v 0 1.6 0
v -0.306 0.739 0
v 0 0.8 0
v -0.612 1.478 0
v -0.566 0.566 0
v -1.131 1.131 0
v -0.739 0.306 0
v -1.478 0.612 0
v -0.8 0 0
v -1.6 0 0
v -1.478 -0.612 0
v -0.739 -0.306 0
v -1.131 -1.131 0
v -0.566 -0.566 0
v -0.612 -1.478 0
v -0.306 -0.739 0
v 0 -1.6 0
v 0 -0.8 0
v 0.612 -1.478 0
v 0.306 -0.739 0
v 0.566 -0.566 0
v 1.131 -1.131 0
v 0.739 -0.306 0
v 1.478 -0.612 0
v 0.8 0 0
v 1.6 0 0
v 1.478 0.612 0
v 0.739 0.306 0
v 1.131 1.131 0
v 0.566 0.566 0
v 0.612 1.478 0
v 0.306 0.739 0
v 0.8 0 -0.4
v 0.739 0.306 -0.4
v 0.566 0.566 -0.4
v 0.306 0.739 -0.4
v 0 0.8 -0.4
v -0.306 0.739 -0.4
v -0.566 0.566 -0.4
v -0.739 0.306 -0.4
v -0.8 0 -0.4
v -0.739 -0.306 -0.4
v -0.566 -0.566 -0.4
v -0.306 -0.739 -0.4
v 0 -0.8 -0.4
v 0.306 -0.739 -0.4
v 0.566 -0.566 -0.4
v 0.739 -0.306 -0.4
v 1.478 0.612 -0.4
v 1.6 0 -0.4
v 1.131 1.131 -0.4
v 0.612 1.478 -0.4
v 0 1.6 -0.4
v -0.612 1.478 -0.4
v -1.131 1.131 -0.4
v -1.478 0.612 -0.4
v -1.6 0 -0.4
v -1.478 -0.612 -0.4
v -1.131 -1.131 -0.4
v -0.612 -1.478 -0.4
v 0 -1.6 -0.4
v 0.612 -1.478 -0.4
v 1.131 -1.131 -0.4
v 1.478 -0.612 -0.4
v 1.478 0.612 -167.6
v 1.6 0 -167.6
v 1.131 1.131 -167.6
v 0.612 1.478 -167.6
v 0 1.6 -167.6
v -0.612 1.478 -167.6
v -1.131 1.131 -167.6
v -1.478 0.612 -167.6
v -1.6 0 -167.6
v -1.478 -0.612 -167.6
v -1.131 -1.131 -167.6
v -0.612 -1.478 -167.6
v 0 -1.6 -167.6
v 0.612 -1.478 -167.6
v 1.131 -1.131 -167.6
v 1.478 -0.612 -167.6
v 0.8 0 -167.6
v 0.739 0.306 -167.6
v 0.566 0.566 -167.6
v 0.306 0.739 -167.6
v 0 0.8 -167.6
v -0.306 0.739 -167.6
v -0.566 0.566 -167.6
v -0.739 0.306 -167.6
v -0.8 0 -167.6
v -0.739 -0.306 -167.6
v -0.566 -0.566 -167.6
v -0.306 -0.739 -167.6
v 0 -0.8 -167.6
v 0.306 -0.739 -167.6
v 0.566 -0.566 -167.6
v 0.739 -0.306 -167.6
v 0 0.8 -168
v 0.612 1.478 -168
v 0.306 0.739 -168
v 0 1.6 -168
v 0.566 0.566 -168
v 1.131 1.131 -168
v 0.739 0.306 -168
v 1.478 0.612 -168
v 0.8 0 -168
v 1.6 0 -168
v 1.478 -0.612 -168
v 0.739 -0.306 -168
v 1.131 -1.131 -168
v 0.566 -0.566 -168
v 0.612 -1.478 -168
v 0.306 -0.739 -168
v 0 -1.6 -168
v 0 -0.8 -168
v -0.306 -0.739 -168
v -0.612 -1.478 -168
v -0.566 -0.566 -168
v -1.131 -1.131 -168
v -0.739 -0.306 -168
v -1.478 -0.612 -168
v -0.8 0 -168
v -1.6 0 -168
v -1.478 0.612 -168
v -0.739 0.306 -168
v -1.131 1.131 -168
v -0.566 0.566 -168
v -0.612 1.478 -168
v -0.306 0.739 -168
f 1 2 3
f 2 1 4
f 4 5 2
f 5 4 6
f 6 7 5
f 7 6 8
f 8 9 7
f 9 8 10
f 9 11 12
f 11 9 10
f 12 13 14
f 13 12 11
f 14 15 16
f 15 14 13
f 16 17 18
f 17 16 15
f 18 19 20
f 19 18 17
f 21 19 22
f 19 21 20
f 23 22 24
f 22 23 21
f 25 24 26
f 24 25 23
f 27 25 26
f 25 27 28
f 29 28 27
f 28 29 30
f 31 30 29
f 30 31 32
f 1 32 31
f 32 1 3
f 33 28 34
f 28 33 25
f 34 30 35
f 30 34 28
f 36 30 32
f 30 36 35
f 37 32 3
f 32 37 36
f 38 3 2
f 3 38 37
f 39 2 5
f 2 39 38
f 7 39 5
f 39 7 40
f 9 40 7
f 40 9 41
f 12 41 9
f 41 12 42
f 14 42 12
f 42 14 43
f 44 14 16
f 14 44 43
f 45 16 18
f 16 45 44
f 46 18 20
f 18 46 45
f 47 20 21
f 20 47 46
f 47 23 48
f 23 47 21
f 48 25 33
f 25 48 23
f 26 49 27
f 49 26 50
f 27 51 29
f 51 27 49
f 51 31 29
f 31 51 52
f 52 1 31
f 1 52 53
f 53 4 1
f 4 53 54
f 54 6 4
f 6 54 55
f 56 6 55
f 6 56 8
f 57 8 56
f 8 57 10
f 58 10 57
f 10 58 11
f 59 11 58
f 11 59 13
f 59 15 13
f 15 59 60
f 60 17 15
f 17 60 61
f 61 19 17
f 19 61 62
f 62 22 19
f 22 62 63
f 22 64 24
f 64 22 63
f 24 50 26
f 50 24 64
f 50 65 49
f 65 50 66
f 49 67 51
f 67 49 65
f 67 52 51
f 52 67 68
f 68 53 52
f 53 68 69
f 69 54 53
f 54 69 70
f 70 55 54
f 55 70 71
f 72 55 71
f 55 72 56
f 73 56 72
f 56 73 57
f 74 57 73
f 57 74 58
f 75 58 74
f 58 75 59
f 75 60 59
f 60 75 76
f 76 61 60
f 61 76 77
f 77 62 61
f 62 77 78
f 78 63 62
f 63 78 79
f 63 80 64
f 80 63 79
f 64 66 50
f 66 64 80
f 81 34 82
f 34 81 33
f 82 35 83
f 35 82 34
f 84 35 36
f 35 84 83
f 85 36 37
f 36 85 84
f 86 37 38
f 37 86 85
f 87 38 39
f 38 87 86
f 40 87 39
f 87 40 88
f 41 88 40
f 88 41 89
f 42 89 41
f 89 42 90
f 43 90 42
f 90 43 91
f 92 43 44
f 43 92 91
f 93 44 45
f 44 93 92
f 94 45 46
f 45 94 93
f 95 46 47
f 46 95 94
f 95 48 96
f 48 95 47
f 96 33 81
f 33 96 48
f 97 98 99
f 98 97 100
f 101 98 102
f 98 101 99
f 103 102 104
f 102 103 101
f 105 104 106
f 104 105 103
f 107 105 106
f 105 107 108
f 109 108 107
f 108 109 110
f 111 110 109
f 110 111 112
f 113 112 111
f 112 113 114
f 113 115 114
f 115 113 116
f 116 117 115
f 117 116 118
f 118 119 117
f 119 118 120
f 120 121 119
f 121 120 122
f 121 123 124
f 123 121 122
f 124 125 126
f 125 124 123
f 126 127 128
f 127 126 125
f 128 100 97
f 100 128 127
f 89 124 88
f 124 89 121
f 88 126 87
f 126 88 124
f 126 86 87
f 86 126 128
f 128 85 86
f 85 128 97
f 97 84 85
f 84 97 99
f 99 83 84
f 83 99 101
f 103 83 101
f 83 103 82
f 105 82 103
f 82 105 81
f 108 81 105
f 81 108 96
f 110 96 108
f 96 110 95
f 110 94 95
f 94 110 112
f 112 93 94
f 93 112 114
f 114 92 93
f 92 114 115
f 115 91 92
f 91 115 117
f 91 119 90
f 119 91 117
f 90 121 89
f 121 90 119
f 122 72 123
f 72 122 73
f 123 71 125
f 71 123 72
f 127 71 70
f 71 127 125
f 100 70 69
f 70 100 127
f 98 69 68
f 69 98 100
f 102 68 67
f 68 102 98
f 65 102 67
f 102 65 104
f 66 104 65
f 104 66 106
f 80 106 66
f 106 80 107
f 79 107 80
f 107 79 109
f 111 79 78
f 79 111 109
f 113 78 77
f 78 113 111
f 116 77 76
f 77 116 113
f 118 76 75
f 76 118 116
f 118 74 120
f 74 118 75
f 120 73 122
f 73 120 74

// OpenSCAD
// file: ../p/4-4disc.scad
use <../lib.scad>
$fa=1; $fs=0.2;
function ldraw_lib__4_4disc(realsolid=false) = [
// 0 Disc 1.0
// 0 Name: 4-4disc.dat
// 0 Author: James Jessiman
// 0 !LDRAW_ORG Primitive UPDATE 2002-02
// 0 !LICENSE Licensed under CC BY 2.0 and CC BY 4.0 : see CAreadme.txt
// 
// 0 BFC CERTIFY CCW
  [0,"BFC","CERTIFY"],
  [0,"BFC","CCW"],
// 
// 0 !HISTORY 1998-12-15 [PTadmin] Official Update 1998-10
// 0 !HISTORY 2002-03-23 [sbliss] Added BFC statement
// 0 !HISTORY 2002-04-25 [PTadmin] Official Update 2002-02
// 0 !HISTORY 2007-06-24 [PTadmin] Header formatted for Contributor Agreement
// 0 !HISTORY 2008-07-01 [PTadmin] Official Update 2008-01
// 
// 
// 3 16 0 0 0 1 0 0 0.9239 0 0.3827
  [3,16,0,0,0,1,0,0,0.9239,0,0.3827],
// 3 16 0 0 0 0.9239 0 0.3827 0.7071 0 0.7071
  [3,16,0,0,0,0.9239,0,0.3827,0.7071,0,0.7071],
// 3 16 0 0 0 0.7071 0 0.7071 0.3827 0 0.9239
  [3,16,0,0,0,0.7071,0,0.7071,0.3827,0,0.9239],
// 3 16 0 0 0 0.3827 0 0.9239 0 0 1
  [3,16,0,0,0,0.3827,0,0.9239,0,0,1],
// 3 16 0 0 0 0 0 1 -0.3827 0 0.9239
  [3,16,0,0,0,0,0,1,-0.3827,0,0.9239],
// 3 16 0 0 0 -0.3827 0 0.9239 -0.7071 0 0.7071
  [3,16,0,0,0,-0.3827,0,0.9239,-0.7071,0,0.7071],
// 3 16 0 0 0 -0.7071 0 0.7071 -0.9239 0 0.3827
  [3,16,0,0,0,-0.7071,0,0.7071,-0.9239,0,0.3827],
// 3 16 0 0 0 -0.9239 0 0.3827 -1 0 -0
  [3,16,0,0,0,-0.9239,0,0.3827,-1,0,-0],
// 3 16 0 0 0 -1 0 -0 -0.9239 0 -0.3827
  [3,16,0,0,0,-1,0,-0,-0.9239,0,-0.3827],
// 3 16 0 0 0 -0.9239 0 -0.3827 -0.7071 0 -0.7071
  [3,16,0,0,0,-0.9239,0,-0.3827,-0.7071,0,-0.7071],
// 3 16 0 0 0 -0.7071 0 -0.7071 -0.3827 0 -0.9239
  [3,16,0,0,0,-0.7071,0,-0.7071,-0.3827,0,-0.9239],
// 3 16 0 0 0 -0.3827 0 -0.9239 0 0 -1
  [3,16,0,0,0,-0.3827,0,-0.9239,0,0,-1],
// 3 16 0 0 0 0 0 -1 0.3827 0 -0.9239
  [3,16,0,0,0,0,0,-1,0.3827,0,-0.9239],
// 3 16 0 0 0 0.3827 0 -0.9239 0.7071 0 -0.7071
  [3,16,0,0,0,0.3827,0,-0.9239,0.7071,0,-0.7071],
// 3 16 0 0 0 0.7071 0 -0.7071 0.9239 0 -0.3827
  [3,16,0,0,0,0.7071,0,-0.7071,0.9239,0,-0.3827],
// 3 16 0 0 0 0.9239 0 -0.3827 1 0 0
  [3,16,0,0,0,0.9239,0,-0.3827,1,0,0],
// 0
];
module ldraw_lib__4_4disc(step=0, col=false, unit=2/5, alt=false, line=0.2, solid=!$preview)
    makepoly(ldraw_lib__4_4disc(solid), step=step, col=col, unit=unit, alt=alt, line=line, solid=solid);
ldraw_lib__4_4disc(line=0.2);
// file: ../p/stud3.scad
use <../lib.scad>
use <4-4cyli.scad>
use <4-4disc.scad>
use <4-4edge.scad>
$fa=1; $fs=0.2;
function ldraw_lib__stud3(realsolid=false) = realsolid ? 
    [openscad(translate([0,0,-eps()], o=cylinder(4+eps(), r=4)),2)] : [
// 0 Stud Tube Solid
// 0 Name: stud3.dat
// 0 Author: James Jessiman
// 0 !LDRAW_ORG Primitive UPDATE 2012-01
// 0 !LICENSE Licensed under CC BY 2.0 and CC BY 4.0 : see CAreadme.txt
// 
// 0 BFC CERTIFY CCW
  [0,"BFC","CERTIFY"],
  [0,"BFC","CCW"],
// 
// 0 !HISTORY 2002-04-04 [sbliss] Modified for BFC compliance
// 0 !HISTORY 2002-04-25 [PTadmin] Official Update 2002-02
// 0 !HISTORY 2007-06-24 [PTadmin] Header formatted for Contributor Agreement
// 0 !HISTORY 2008-07-01 [PTadmin] Official Update 2008-01
// 0 !HISTORY 2012-02-16 [Philo] Changed to CCW
// 0 !HISTORY 2012-03-30 [PTadmin] Official Update 2012-01
// 
// 
// 1 16 0 -4 0 4 0 0 0 1 0 0 0 4 4-4edge.dat
  [1,16,0,-4,0,4,0,0,0,1,0,0,0,4, ldraw_lib__4_4edge(realsolid)],
// 1 16 0 0 0 4 0 0 0 1 0 0 0 4 4-4edge.dat
  [1,16,0,0,0,4,0,0,0,1,0,0,0,4, ldraw_lib__4_4edge(realsolid)],
// 1 16 0 -4 0 4 0 0 0 1 0 0 0 4 4-4disc.dat
  [1,16,0,-4,0,4,0,0,0,1,0,0,0,4, ldraw_lib__4_4disc(realsolid)],
// 1 16 0 -4 0 4 0 0 0 4 0 0 0 4 4-4cyli.dat
  [1,16,0,-4,0,4,0,0,0,4,0,0,0,4, ldraw_lib__4_4cyli(realsolid)],
];
module ldraw_lib__stud3(step=0, col=false, unit=2/5, alt=false, line=0.2, solid=!$preview)
    makepoly(ldraw_lib__stud3(solid), step=step, col=col, unit=unit, alt=alt, line=line, solid=solid);
ldraw_lib__stud3(line=0.2);
// file: ../p/stud.scad
use <../lib.scad>
use <4-4cyli.scad>
use <4-4disc.scad>
use <4-4edge.scad>
$fa=1; $fs=0.2;
function ldraw_lib__stud(realsolid=false) = realsolid ? 
    [openscad(translate([0,0,-eps()], o=cylinder(4+eps(), r=6)),2)] : [
// 0 Stud
// 0 Name: stud.dat
// 0 Author: James Jessiman
// 0 !LDRAW_ORG Primitive UPDATE 2012-01
// 0 !LICENSE Licensed under CC BY 2.0 and CC BY 4.0 : see CAreadme.txt
// 
// 0 BFC CERTIFY CCW
  [0,"BFC","CERTIFY"],
  [0,"BFC","CCW"],
// 
// 0 !HISTORY 2002-04-04 [sbliss] Modified for BFC compliance
// 0 !HISTORY 2002-04-25 [PTadmin] Official Update 2002-02
// 0 !HISTORY 2007-06-24 [PTadmin] Header formatted for Contributor Agreement
// 0 !HISTORY 2008-07-01 [PTadmin] Official Update 2008-01
// 0 !HISTORY 2012-02-16 [Philo] Changed to CCW
// 0 !HISTORY 2012-03-30 [PTadmin] Official Update 2012-01
// 
// 
// 1 16 0 0 0 6 0 0 0 1 0 0 0 6 4-4edge.dat
  [1,16,0,0,0,6,0,0,0,1,0,0,0,6, ldraw_lib__4_4edge(realsolid)],
// 1 16 0 -4 0 6 0 0 0 1 0 0 0 6 4-4edge.dat
  [1,16,0,-4,0,6,0,0,0,1,0,0,0,6, ldraw_lib__4_4edge(realsolid)],
// 1 16 0 0 0 6 0 0 0 -4 0 0 0 6 4-4cyli.dat
  [1,16,0,0,0,6,0,0,0,-4,0,0,0,6, ldraw_lib__4_4cyli(realsolid)],
// 1 16 0 -4 0 6 0 0 0 1 0 0 0 6 4-4disc.dat
  [1,16,0,-4,0,6,0,0,0,1,0,0,0,6, ldraw_lib__4_4disc(realsolid)],
];
module ldraw_lib__stud(step=0, col=false, unit=2/5, alt=false, line=0.2, solid=!$preview)
    makepoly(ldraw_lib__stud(solid), step=step, col=col, unit=unit, alt=alt, line=line, solid=solid);
ldraw_lib__stud(line=0.2);
// file: ../p/box5.scad
use <../lib.scad>
$fa=1; $fs=0.2;
function ldraw_lib__box5(realsolid=false) = [
// 0 Box with 5 Faces and All Edges
// 0 Name: box5.dat
// 0 Author: James Jessiman
// 0 !LDRAW_ORG Primitive UPDATE 2012-01
// 0 !LICENSE Licensed under CC BY 2.0 and CC BY 4.0 : see CAreadme.txt
// 
// 0 BFC CERTIFY CCW
  [0,"BFC","CERTIFY"],
  [0,"BFC","CCW"],
// 
// 0 !HISTORY 2002-04-03 [sbliss] Modified for BFC compliance
// 0 !HISTORY 2002-04-25 [PTadmin] Official Update 2002-02
// 0 !HISTORY 2007-06-24 [PTadmin] Header formatted for Contributor Agreement
// 0 !HISTORY 2008-07-01 [PTadmin] Official Update 2008-01
// 0 !HISTORY 2012-02-16 [Philo] Changed to CCW
// 0 !HISTORY 2012-03-30 [PTadmin] Official Update 2012-01
// 
// 
// 2 24 1 1 1 -1 1 1
  [2,24,1,1,1,-1,1,1],
// 2 24 -1 1 1 -1 1 -1
  [2,24,-1,1,1,-1,1,-1],
// 2 24 -1 1 -1 1 1 -1
  [2,24,-1,1,-1,1,1,-1],
// 2 24 1 1 -1 1 1 1
  [2,24,1,1,-1,1,1,1],
// 2 24 1 0 1 -1 0 1
  [2,24,1,0,1,-1,0,1],
// 2 24 -1 0 1 -1 0 -1
  [2,24,-1,0,1,-1,0,-1],
// 2 24 -1 0 -1 1 0 -1
  [2,24,-1,0,-1,1,0,-1],
// 2 24 1 0 -1 1 0 1
  [2,24,1,0,-1,1,0,1],
// 2 24 1 0 1 1 1 1
  [2,24,1,0,1,1,1,1],
// 2 24 -1 0 1 -1 1 1
  [2,24,-1,0,1,-1,1,1],
// 2 24 1 0 -1 1 1 -1
  [2,24,1,0,-1,1,1,-1],
// 2 24 -1 0 -1 -1 1 -1
  [2,24,-1,0,-1,-1,1,-1],
// 4 16 -1 1 1 1 1 1 1 1 -1 -1 1 -1
  [4,16,-1,1,1,1,1,1,1,1,-1,-1,1,-1],
// 4 16 -1 1 1 -1 0 1 1 0 1 1 1 1
  [4,16,-1,1,1,-1,0,1,1,0,1,1,1,1],
// 4 16 -1 1 -1 -1 0 -1 -1 0 1 -1 1 1
  [4,16,-1,1,-1,-1,0,-1,-1,0,1,-1,1,1],
// 4 16 1 1 -1 1 0 -1 -1 0 -1 -1 1 -1
  [4,16,1,1,-1,1,0,-1,-1,0,-1,-1,1,-1],
// 4 16 1 1 1 1 0 1 1 0 -1 1 1 -1
  [4,16,1,1,1,1,0,1,1,0,-1,1,1,-1],
];
module ldraw_lib__box5(step=0, col=false, unit=2/5, alt=false, line=0.2, solid=!$preview)
    makepoly(ldraw_lib__box5(solid), step=step, col=col, unit=unit, alt=alt, line=line, solid=solid);
ldraw_lib__box5(line=0.2);
// file: ../p/box4t.scad
use <../lib.scad>
$fa=1; $fs=0.2;
function ldraw_lib__box4t(realsolid=false) = [
// 0 Box with 4 Adjacent Faces and All Edges
// 0 Name: box4t.dat
// 0 Author: Tore Eriksson [Tore_Eriksson]
// 0 !LDRAW_ORG Primitive UPDATE 2003-02
// 0 !LICENSE Licensed under CC BY 2.0 and CC BY 4.0 : see CAreadme.txt
// 
// 0 BFC CERTIFY CCW
  [0,"BFC","CERTIFY"],
  [0,"BFC","CCW"],
// 
// 0 !HISTORY 1997-09-29 [PTadmin] Official Update 1997-15
// 0 !HISTORY 2002-08-31 [izanette] Modified with WINDZ for BFC compliance
// 0 !HISTORY 2003-08-01 [PTadmin] Official Update 2003-02
// 0 !HISTORY 2007-06-24 [PTadmin] Header formatted for Contributor Agreement
// 0 !HISTORY 2008-07-01 [PTadmin] Official Update 2008-01
// 
// 
// 2 24 1 1 1 -1 1 1
  [2,24,1,1,1,-1,1,1],
// 2 24 -1 1 1 -1 1 -1
  [2,24,-1,1,1,-1,1,-1],
// 2 24 -1 1 -1 1 1 -1
  [2,24,-1,1,-1,1,1,-1],
// 2 24 1 1 -1 1 1 1
  [2,24,1,1,-1,1,1,1],
// 2 24 1 0 1 -1 0 1
  [2,24,1,0,1,-1,0,1],
// 2 24 -1 0 1 -1 0 -1
  [2,24,-1,0,1,-1,0,-1],
// 2 24 -1 0 -1 1 0 -1
  [2,24,-1,0,-1,1,0,-1],
// 2 24 1 0 -1 1 0 1
  [2,24,1,0,-1,1,0,1],
// 2 24 1 0 1 1 1 1
  [2,24,1,0,1,1,1,1],
// 2 24 -1 0 1 -1 1 1
  [2,24,-1,0,1,-1,1,1],
// 2 24 1 0 -1 1 1 -1
  [2,24,1,0,-1,1,1,-1],
// 2 24 -1 0 -1 -1 1 -1
  [2,24,-1,0,-1,-1,1,-1],
// 4 16 1 1 1 1 1 -1 -1 1 -1 -1 1 1
  [4,16,1,1,1,1,1,-1,-1,1,-1,-1,1,1],
// 4 16 1 1 1 -1 1 1 -1 0 1 1 0 1
  [4,16,1,1,1,-1,1,1,-1,0,1,1,0,1],
// 4 16 -1 1 1 -1 1 -1 -1 0 -1 -1 0 1
  [4,16,-1,1,1,-1,1,-1,-1,0,-1,-1,0,1],
// 0 4 16 -1 1 -1 -1 0 -1 1 0 -1 1 1 -1
// 4 16 1 1 -1 1 1 1 1 0 1 1 0 -1
  [4,16,1,1,-1,1,1,1,1,0,1,1,0,-1],
// 0
];
module ldraw_lib__box4t(step=0, col=false, unit=2/5, alt=false, line=0.2, solid=!$preview)
    makepoly(ldraw_lib__box4t(solid), step=step, col=col, unit=unit, alt=alt, line=line, solid=solid);
ldraw_lib__box4t(line=0.2);
// file: s/3004s01.scad
use <../../lib.scad>
use <../../p/box4t.scad>
use <../../p/box5.scad>
use <../../p/stud.scad>
use <../../p/stud3.scad>
$fa=1; $fs=0.2;
function ldraw_lib__s__3004s01(realsolid=false) = [
// 0 ~Brick  1 x  2 without Front Face
// 0 Name: s\3004s01.dat
// 0 Author: James Jessiman
// 0 !LDRAW_ORG Subpart UPDATE 2003-03
// 0 !LICENSE Licensed under CC BY 2.0 and CC BY 4.0 : see CAreadme.txt
// 
// 0 BFC CERTIFY CCW
  [0,"BFC","CERTIFY"],
  [0,"BFC","CCW"],
// 
// 0 !HISTORY 2003-09-07 [jriley] Subfiling, BFC
// 0 !HISTORY 2003-12-19 [PTadmin] Official Update 2003-03
// 0 !HISTORY 2007-08-29 [PTadmin] Header formatted for Contributor Agreement
// 0 !HISTORY 2008-07-01 [PTadmin] Official Update 2008-01
// 
// 
// 1 16 0 4 0 1 0 0 0 -5 0 0 0 1 stud3.dat
  [1,16,0,4,0,1,0,0,0,-5,0,0,0,1, ldraw_lib__stud3(realsolid)],
// 0 BFC INVERTNEXT
  [0,"BFC","INVERTNEXT"],
// 1 16 0 24 0 16 0 0 0 -20 0 0 0 6 box5.dat
  [1,16,0,24,0,16,0,0,0,-20,0,0,0,6, ldraw_lib__box5(realsolid)],
// 4 16 20 24 10 16 24 6 -16 24 6 -20 24 10
  [4,16,20,24,10,16,24,6,-16,24,6,-20,24,10],
// 4 16 -20 24 10 -16 24 6 -16 24 -6 -20 24 -10
  [4,16,-20,24,10,-16,24,6,-16,24,-6,-20,24,-10],
// 4 16 -20 24 -10 -16 24 -6 16 24 -6 20 24 -10
  [4,16,-20,24,-10,-16,24,-6,16,24,-6,20,24,-10],
// 4 16 20 24 -10 16 24 -6 16 24 6 20 24 10
  [4,16,20,24,-10,16,24,-6,16,24,6,20,24,10],
// 1 16 0 24 0 20 0 0 0 -24 0 0 0 10 box4t.dat
  [1,16,0,24,0,20,0,0,0,-24,0,0,0,10, ldraw_lib__box4t(realsolid)],
// 1 16 10 0 0 1 0 0 0 1 0 0 0 1 stud.dat
  [1,16,10,0,0,1,0,0,0,1,0,0,0,1, ldraw_lib__stud(realsolid)],
// 1 16 -10 0 0 1 0 0 0 1 0 0 0 1 stud.dat
  [1,16,-10,0,0,1,0,0,0,1,0,0,0,1, ldraw_lib__stud(realsolid)],
// 0
];
module ldraw_lib__s__3004s01(step=0, col=false, unit=2/5, alt=false, line=0.2, solid=!$preview)
    makepoly(ldraw_lib__s__3004s01(solid), step=step, col=col, unit=unit, alt=alt, line=line, solid=solid);
ldraw_lib__s__3004s01(line=0.2);
// file: ../p/4-4ring1.scad
use <../lib.scad>
$fa=1; $fs=0.2;
function ldraw_lib__4_4ring1(realsolid=false) = [
// 0 Ring  1 x 1.0
// 0 Name: 4-4ring1.dat
// 0 Author: James Jessiman
// 0 !LDRAW_ORG Primitive UPDATE 2009-01
// 0 !LICENSE Licensed under CC BY 2.0 and CC BY 4.0 : see CAreadme.txt
// 
// 0 BFC CERTIFY CCW
  [0,"BFC","CERTIFY"],
  [0,"BFC","CCW"],
// 
// 0 !HISTORY 1998-12-15 [PTadmin] Official Update 1998-10
// 0 !HISTORY 2002-04-08 [BrickCaster] Modified for BFC compliance
// 0 !HISTORY 2002-04-25 [PTadmin] Official Update 2002-02
// 0 !HISTORY 2007-06-24 [PTadmin] Header formatted for Contributor Agreement
// 0 !HISTORY 2008-07-01 [PTadmin] Official Update 2008-01
// 0 !HISTORY 2008-08-26 [cwdee] Switch polygon winding and rename
// 0 !HISTORY 2009-05-02 [PTadmin] Official Update 2009-01
// 
// 
// 4 16 -0.7654 0 1.8478 -0.3827 0 0.9239 0 0 1 0 0 2
  [4,16,-0.7654,0,1.8478,-0.3827,0,0.9239,0,0,1,0,0,2],
// 4 16 -1.4142 0 1.4142 -0.7071 0 0.7071 -0.3827 0 0.9239 -0.7654 0 1.8478
  [4,16,-1.4142,0,1.4142,-0.7071,0,0.7071,-0.3827,0,0.9239,-0.7654,0,1.8478],
// 4 16 -1.8478 0 0.7654 -0.9239 0 0.3827 -0.7071 0 0.7071 -1.4142 0 1.41420
  [4,16,-1.8478,0,0.7654,-0.9239,0,0.3827,-0.7071,0,0.7071,-1.4142,0,1.41420],
// 4 16 -2 0 0 -1 0 0 -0.9239 0 0.3827 -1.8478 0 0.7654
  [4,16,-2,0,0,-1,0,0,-0.9239,0,0.3827,-1.8478,0,0.7654],
// 4 16 -1.8478 0 -0.7654 -0.9239 0 -0.3827 -1 0 0 -2 0 0
  [4,16,-1.8478,0,-0.7654,-0.9239,0,-0.3827,-1,0,0,-2,0,0],
// 4 16 -1.4142 0 -1.4142 -0.7071 0 -0.7071 -0.9239 0 -0.3827 -1.8478 0 -0.7654
  [4,16,-1.4142,0,-1.4142,-0.7071,0,-0.7071,-0.9239,0,-0.3827,-1.8478,0,-0.7654],
// 4 16 -0.7654 0 -1.8478 -0.3827 0 -0.9239 -0.7071 0 -0.7071 -1.4142 0 -1.4142
  [4,16,-0.7654,0,-1.8478,-0.3827,0,-0.9239,-0.7071,0,-0.7071,-1.4142,0,-1.4142],
// 4 16 0 0 -2 0 0 -1 -0.3827 0 -0.9239 -0.7654 0 -1.8478
  [4,16,0,0,-2,0,0,-1,-0.3827,0,-0.9239,-0.7654,0,-1.8478],
// 4 16 0.7654 0 -1.8478 0.3827 0 -0.9239 0 0 -1 0 0 -2
  [4,16,0.7654,0,-1.8478,0.3827,0,-0.9239,0,0,-1,0,0,-2],
// 4 16 1.4142 0 -1.4142 0.7071 0 -0.7071 0.3827 0 -0.9239 0.7654 0 -1.8478
  [4,16,1.4142,0,-1.4142,0.7071,0,-0.7071,0.3827,0,-0.9239,0.7654,0,-1.8478],
// 4 16 1.8478 0 -0.7654 0.9239 0 -0.3827 0.7071 0 -0.7071 1.4142 0 -1.4142
  [4,16,1.8478,0,-0.7654,0.9239,0,-0.3827,0.7071,0,-0.7071,1.4142,0,-1.4142],
// 4 16 2 0 0 1 0 0 0.9239 0 -0.3827 1.8478 0 -0.7654
  [4,16,2,0,0,1,0,0,0.9239,0,-0.3827,1.8478,0,-0.7654],
// 4 16 1.8478 0 0.7654 0.9239 0 0.3827 1 0 0 2 0 0
  [4,16,1.8478,0,0.7654,0.9239,0,0.3827,1,0,0,2,0,0],
// 4 16 1.4142 0 1.4142 0.7071 0 0.7071 0.9239 0 0.3827 1.8478 0 0.7654
  [4,16,1.4142,0,1.4142,0.7071,0,0.7071,0.9239,0,0.3827,1.8478,0,0.7654],
// 4 16 0.7654 0 1.8478 0.3827 0 0.9239 0.7071 0 0.7071 1.4142 0 1.4142
  [4,16,0.7654,0,1.8478,0.3827,0,0.9239,0.7071,0,0.7071,1.4142,0,1.4142],
// 4 16 0 0 2 0 0 1 0.3827 0 0.9239 0.7654 0 1.8478
  [4,16,0,0,2,0,0,1,0.3827,0,0.9239,0.7654,0,1.8478],
// 0
];
module ldraw_lib__4_4ring1(step=0, col=false, unit=2/5, alt=false, line=0.2, solid=!$preview)
    makepoly(ldraw_lib__4_4ring1(solid), step=step, col=col, unit=unit, alt=alt, line=line, solid=solid);
ldraw_lib__4_4ring1(line=0.2);
// file: ../p/4-4edge.scad
use <../lib.scad>
$fa=1; $fs=0.2;
function ldraw_lib__4_4edge(realsolid=false) = [
// 0 Circle 1.0
// 0 Name: 4-4edge.dat
// 0 Author: James Jessiman
// 0 !LDRAW_ORG Primitive UPDATE 2017-01
// 0 !LICENSE Licensed under CC BY 2.0 and CC BY 4.0 : see CAreadme.txt
// 
// 0 BFC CERTIFY CCW
  [0,"BFC","CERTIFY"],
  [0,"BFC","CCW"],
// 
// 0 !HISTORY 1998-12-15 [PTadmin] Official Update 1998-10
// 0 !HISTORY 2005-12-28 [PTadmin] Official Update 2005-01
// 0 !HISTORY 2007-06-24 [PTadmin] Header formatted for Contributor Agreement
// 0 !HISTORY 2008-07-01 [PTadmin] Official Update 2008-01
// 0 !HISTORY 2017-01-15 [Steffen] BFCed
// 0 !HISTORY 2017-12-30 [PTadmin] Official Update 2017-01
// 
// 
// 2 24 1 0 0 0.9239 0 0.3827
  [2,24,1,0,0,0.9239,0,0.3827],
// 2 24 0.9239 0 0.3827 0.7071 0 0.7071
  [2,24,0.9239,0,0.3827,0.7071,0,0.7071],
// 2 24 0.7071 0 0.7071 0.3827 0 0.9239
  [2,24,0.7071,0,0.7071,0.3827,0,0.9239],
// 2 24 0.3827 0 0.9239 0 0 1
  [2,24,0.3827,0,0.9239,0,0,1],
// 2 24 0 0 1 -0.3827 0 0.9239
  [2,24,0,0,1,-0.3827,0,0.9239],
// 2 24 -0.3827 0 0.9239 -0.7071 0 0.7071
  [2,24,-0.3827,0,0.9239,-0.7071,0,0.7071],
// 2 24 -0.7071 0 0.7071 -0.9239 0 0.3827
  [2,24,-0.7071,0,0.7071,-0.9239,0,0.3827],
// 2 24 -0.9239 0 0.3827 -1 0 -0
  [2,24,-0.9239,0,0.3827,-1,0,-0],
// 2 24 -1 0 -0 -0.9239 0 -0.3827
  [2,24,-1,0,-0,-0.9239,0,-0.3827],
// 2 24 -0.9239 0 -0.3827 -0.7071 0 -0.7071
  [2,24,-0.9239,0,-0.3827,-0.7071,0,-0.7071],
// 2 24 -0.7071 0 -0.7071 -0.3827 0 -0.9239
  [2,24,-0.7071,0,-0.7071,-0.3827,0,-0.9239],
// 2 24 -0.3827 0 -0.9239 0 0 -1
  [2,24,-0.3827,0,-0.9239,0,0,-1],
// 2 24 0 0 -1 0.3827 0 -0.9239
  [2,24,0,0,-1,0.3827,0,-0.9239],
// 2 24 0.3827 0 -0.9239 0.7071 0 -0.7071
  [2,24,0.3827,0,-0.9239,0.7071,0,-0.7071],
// 2 24 0.7071 0 -0.7071 0.9239 0 -0.3827
  [2,24,0.7071,0,-0.7071,0.9239,0,-0.3827],
// 2 24 0.9239 0 -0.3827 1 0 0
  [2,24,0.9239,0,-0.3827,1,0,0],
];
module ldraw_lib__4_4edge(step=0, col=false, unit=2/5, alt=false, line=0.2, solid=!$preview)
    makepoly(ldraw_lib__4_4edge(solid), step=step, col=col, unit=unit, alt=alt, line=line, solid=solid);
ldraw_lib__4_4edge(line=0.2);
// file: ../p/4-4cyli.scad
use <../lib.scad>
$fa=1; $fs=0.2;
function ldraw_lib__4_4cyli(realsolid=false) = [
// 0 Cylinder 1.0
// 0 Name: 4-4cyli.dat
// 0 Author: James Jessiman
// 0 !LDRAW_ORG Primitive UPDATE 2005-01
// 0 !LICENSE Licensed under CC BY 2.0 and CC BY 4.0 : see CAreadme.txt
// 
// 0 BFC CERTIFY CCW
  [0,"BFC","CERTIFY"],
  [0,"BFC","CCW"],
// 
// 0 !HISTORY 1998-12-15 [PTadmin] Official Update 1998-10
// 0 !HISTORY 2002-03-23 [sbliss] Added BFC statement; merged headers from files in distributions LDraw 0.27 and Complete.
// 0 !HISTORY 2002-04-25 [PTadmin] Official Update 2002-02
// 0 !HISTORY 2004-12-14 [guyvivan] BFC CCW
// 0 !HISTORY 2005-12-28 [PTadmin] Official Update 2005-01
// 0 !HISTORY 2007-06-24 [PTadmin] Header formatted for Contributor Agreement
// 0 !HISTORY 2008-07-01 [PTadmin] Official Update 2008-01
// 
// 
// 4 16 1 1 0 0.9239 1 0.3827 0.9239 0 0.3827 1 0 0
  [4,16,1,1,0,0.9239,1,0.3827,0.9239,0,0.3827,1,0,0],
// 5 24 1 0 0 1 1 0 0.9239 0 0.3827 0.9239 0 -0.3827
  [5,24,1,0,0,1,1,0,0.9239,0,0.3827,0.9239,0,-0.3827],
// 4 16 0.9239 1 0.3827 0.7071 1 0.7071 0.7071 0 0.7071 0.9239 0 0.3827
  [4,16,0.9239,1,0.3827,0.7071,1,0.7071,0.7071,0,0.7071,0.9239,0,0.3827],
// 5 24 0.9239 0 0.3827 0.9239 1 0.3827 0.7071 0 0.7071 1 0 0
  [5,24,0.9239,0,0.3827,0.9239,1,0.3827,0.7071,0,0.7071,1,0,0],
// 4 16 0.7071 1 0.7071 0.3827 1 0.9239 0.3827 0 0.9239 0.7071 0 0.7071
  [4,16,0.7071,1,0.7071,0.3827,1,0.9239,0.3827,0,0.9239,0.7071,0,0.7071],
// 5 24 0.7071 0 0.7071 0.7071 1 0.7071 0.3827 0 0.9239 0.9239 0 0.3827
  [5,24,0.7071,0,0.7071,0.7071,1,0.7071,0.3827,0,0.9239,0.9239,0,0.3827],
// 4 16 0.3827 1 0.9239 0 1 1 0 0 1 0.3827 0 0.9239
  [4,16,0.3827,1,0.9239,0,1,1,0,0,1,0.3827,0,0.9239],
// 5 24 0.3827 0 0.9239 0.3827 1 0.9239 0 0 1 0.7071 0 0.7071
  [5,24,0.3827,0,0.9239,0.3827,1,0.9239,0,0,1,0.7071,0,0.7071],
// 4 16 0 1 1 -0.3827 1 0.9239 -0.3827 0 0.9239 0 0 1
  [4,16,0,1,1,-0.3827,1,0.9239,-0.3827,0,0.9239,0,0,1],
// 5 24 0 0 1 0 1 1 -0.3827 0 0.9239 0.3827 0 0.9239
  [5,24,0,0,1,0,1,1,-0.3827,0,0.9239,0.3827,0,0.9239],
// 4 16 -0.3827 1 0.9239 -0.7071 1 0.7071 -0.7071 0 0.7071 -0.3827 0 0.9239
  [4,16,-0.3827,1,0.9239,-0.7071,1,0.7071,-0.7071,0,0.7071,-0.3827,0,0.9239],
// 5 24 -0.3827 0 0.9239 -0.3827 1 0.9239 -0.7071 0 0.7071 0 0 1
  [5,24,-0.3827,0,0.9239,-0.3827,1,0.9239,-0.7071,0,0.7071,0,0,1],
// 4 16 -0.7071 1 0.7071 -0.9239 1 0.3827 -0.9239 0 0.3827 -0.7071 0 0.7071
  [4,16,-0.7071,1,0.7071,-0.9239,1,0.3827,-0.9239,0,0.3827,-0.7071,0,0.7071],
// 5 24 -0.7071 0 0.7071 -0.7071 1 0.7071 -0.9239 0 0.3827 -0.3827 0 0.9239
  [5,24,-0.7071,0,0.7071,-0.7071,1,0.7071,-0.9239,0,0.3827,-0.3827,0,0.9239],
// 4 16 -0.9239 1 0.3827 -1 1 0 -1 0 0 -0.9239 0 0.3827
  [4,16,-0.9239,1,0.3827,-1,1,0,-1,0,0,-0.9239,0,0.3827],
// 5 24 -0.9239 0 0.3827 -0.9239 1 0.3827 -1 0 0 -0.7071 0 0.7071
  [5,24,-0.9239,0,0.3827,-0.9239,1,0.3827,-1,0,0,-0.7071,0,0.7071],
// 4 16 -1 1 0 -0.9239 1 -0.3827 -0.9239 0 -0.3827 -1 0 0
  [4,16,-1,1,0,-0.9239,1,-0.3827,-0.9239,0,-0.3827,-1,0,0],
// 5 24 -1 0 0 -1 1 0 -0.9239 0 -0.3827 -0.9239 0 0.3827
  [5,24,-1,0,0,-1,1,0,-0.9239,0,-0.3827,-0.9239,0,0.3827],
// 4 16 -0.9239 1 -0.3827 -0.7071 1 -0.7071 -0.7071 0 -0.7071 -0.9239 0 -0.3827
  [4,16,-0.9239,1,-0.3827,-0.7071,1,-0.7071,-0.7071,0,-0.7071,-0.9239,0,-0.3827],
// 5 24 -0.9239 0 -0.3827 -0.9239 1 -0.3827 -0.7071 0 -0.7071 -1 0 0
  [5,24,-0.9239,0,-0.3827,-0.9239,1,-0.3827,-0.7071,0,-0.7071,-1,0,0],
// 4 16 -0.7071 1 -0.7071 -0.3827 1 -0.9239 -0.3827 0 -0.9239 -0.7071 0 -0.7071
  [4,16,-0.7071,1,-0.7071,-0.3827,1,-0.9239,-0.3827,0,-0.9239,-0.7071,0,-0.7071],
// 5 24 -0.7071 0 -0.7071 -0.7071 1 -0.7071 -0.3827 0 -0.9239 -0.9239 0 -0.3827
  [5,24,-0.7071,0,-0.7071,-0.7071,1,-0.7071,-0.3827,0,-0.9239,-0.9239,0,-0.3827],
// 4 16 -0.3827 1 -0.9239 0 1 -1 0 0 -1 -0.3827 0 -0.9239
  [4,16,-0.3827,1,-0.9239,0,1,-1,0,0,-1,-0.3827,0,-0.9239],
// 5 24 -0.3827 0 -0.9239 -0.3827 1 -0.9239 0 0 -1 -0.7071 0 -0.7071
  [5,24,-0.3827,0,-0.9239,-0.3827,1,-0.9239,0,0,-1,-0.7071,0,-0.7071],
// 4 16 0 1 -1 0.3827 1 -0.9239 0.3827 0 -0.9239 0 0 -1
  [4,16,0,1,-1,0.3827,1,-0.9239,0.3827,0,-0.9239,0,0,-1],
// 5 24 0 0 -1 0 1 -1 0.3827 0 -0.9239 -0.3827 0 -0.9239
  [5,24,0,0,-1,0,1,-1,0.3827,0,-0.9239,-0.3827,0,-0.9239],
// 4 16 0.3827 1 -0.9239 0.7071 1 -0.7071 0.7071 0 -0.7071 0.3827 0 -0.9239
  [4,16,0.3827,1,-0.9239,0.7071,1,-0.7071,0.7071,0,-0.7071,0.3827,0,-0.9239],
// 5 24 0.3827 0 -0.9239 0.3827 1 -0.9239 0.7071 0 -0.7071 0 0 -1
  [5,24,0.3827,0,-0.9239,0.3827,1,-0.9239,0.7071,0,-0.7071,0,0,-1],
// 4 16 0.7071 1 -0.7071 0.9239 1 -0.3827 0.9239 0 -0.3827 0.7071 0 -0.7071
  [4,16,0.7071,1,-0.7071,0.9239,1,-0.3827,0.9239,0,-0.3827,0.7071,0,-0.7071],
// 5 24 0.7071 0 -0.7071 0.7071 1 -0.7071 0.9239 0 -0.3827 0.3827 0 -0.9239
  [5,24,0.7071,0,-0.7071,0.7071,1,-0.7071,0.9239,0,-0.3827,0.3827,0,-0.9239],
// 4 16 0.9239 1 -0.3827 1 1 0 1 0 0 0.9239 0 -0.3827
  [4,16,0.9239,1,-0.3827,1,1,0,1,0,0,0.9239,0,-0.3827],
// 5 24 0.9239 0 -0.3827 0.9239 1 -0.3827 1 0 0 0.7071 0 -0.7071
  [5,24,0.9239,0,-0.3827,0.9239,1,-0.3827,1,0,0,0.7071,0,-0.7071],
// 0
];
module ldraw_lib__4_4cyli(step=0, col=false, unit=2/5, alt=false, line=0.2, solid=!$preview)
    makepoly(ldraw_lib__4_4cyli(solid), step=step, col=col, unit=unit, alt=alt, line=line, solid=solid);
ldraw_lib__4_4cyli(line=0.2);
// file: 3004.scad
use <../lib.scad>
use <s/3004s01.scad>
$fa=1; $fs=0.2;
function ldraw_lib__3004(realsolid=false) = [
// 0 Brick  1 x  2
// 0 Name: 3004.dat
// 0 Author: James Jessiman
// 0 !LDRAW_ORG Part UPDATE 2022-05
// 0 !LICENSE Licensed under CC BY 2.0 and CC BY 4.0 : see CAreadme.txt
// 
// 0 BFC CERTIFY CCW
  [0,"BFC","CERTIFY"],
  [0,"BFC","CCW"],
// 
// 0 !HISTORY 2001-10-26 [PTadmin] Official Update 2001-01
// 0 !HISTORY 2002-05-07 {unknown} BFC Certification
// 0 !HISTORY 2002-06-11 [PTadmin] Official Update 2002-03
// 0 !HISTORY 2007-05-07 [PTadmin] Header formatted for Contributor Agreement
// 0 !HISTORY 2008-07-01 [PTadmin] Official Update 2008-01
// 0 !HISTORY 2022-08-04 [MagFors] Using subfile
// 0 !HISTORY 2022-09-15 [PTadmin] Official Update 2022-05
// 
// 
// 1 16 0 0 0 1 0 0 0 1 0 0 0 1 s\3004s01.dat
  [1,16,0,0,0,1,0,0,0,1,0,0,0,1, ldraw_lib__s__3004s01(realsolid)],
// 4 16 -20 24 -10 20 24 -10 20 0 -10 -20 0 -10
  [4,16,-20,24,-10,20,24,-10,20,0,-10,-20,0,-10],
];
module ldraw_lib__3004(step=0, col=false, unit=2/5, alt=false, line=0.2, solid=!$preview)
    makepoly(ldraw_lib__3004(solid), step=step, col=col, unit=unit, alt=alt, line=line, solid=solid);
ldraw_lib__3004(line=0.2);
// file: u9053.scad
use <../lib.scad>
use <../p/4-4cyli.scad>
use <../p/4-4edge.scad>
use <../p/4-4ring1.scad>
$fa=1; $fs=0.2;
function ldraw_lib__u9053(realsolid=false) = [
// 0 ~Technic Flex-System Hose End
// 0 Name: u9053.dat
// 0 Author: William Howard [WilliamH]
// 0 !LDRAW_ORG Part UPDATE 2011-02
// 0 !LICENSE Licensed under CC BY 2.0 and CC BY 4.0 : see CAreadme.txt
// 
// 0 BFC CERTIFY CCW
  [0,"BFC","CERTIFY"],
  [0,"BFC","CCW"],
// 
// 0 !HISTORY 2011-12-21 [cwdee] Reworked subparting technique
// 0 !HISTORY 2011-12-23 [PTadmin] Renamed from 76
// 0 !HISTORY 2011-12-29 [PTadmin] Official Update 2011-02
// 
// 
// 1 16 0 0 0 2 0 0 0 1 0 0 0 2 4-4ring1.dat
  [1,16,0,0,0,2,0,0,0,1,0,0,0,2, ldraw_lib__4_4ring1(realsolid)],
// 1 16 0 0 0 2 0 0 0 1 0 0 0 2 4-4edge.dat
  [1,16,0,0,0,2,0,0,0,1,0,0,0,2, ldraw_lib__4_4edge(realsolid)],
// 0 BFC INVERTNEXT
  [0,"BFC","INVERTNEXT"],
// 1 16 0 0 0 2 0 0 0 1 0 0 0 2 4-4cyli.dat
  [1,16,0,0,0,2,0,0,0,1,0,0,0,2, ldraw_lib__4_4cyli(realsolid)],
// 1 16 0 0 0 4 0 0 0 1 0 0 0 4 4-4edge.dat
  [1,16,0,0,0,4,0,0,0,1,0,0,0,4, ldraw_lib__4_4edge(realsolid)],
// 1 16 0 0 0 4 0 0 0 1 0 0 0 4 4-4cyli.dat
  [1,16,0,0,0,4,0,0,0,1,0,0,0,4, ldraw_lib__4_4cyli(realsolid)],
// 0
];
module ldraw_lib__u9053(step=0, col=false, unit=2/5, alt=false, line=0.2, solid=!$preview)
    makepoly(ldraw_lib__u9053(solid), step=step, col=col, unit=unit, alt=alt, line=line, solid=solid);
ldraw_lib__u9053(line=0.2);
// file: 77.scad
use <../lib.scad>
use <../p/4-4cyli.scad>
$fa=1; $fs=0.2;
function ldraw_lib__77(realsolid=false) = [
// 0 ~Technic Flex-System Hose Segment
// 0 Name: 77.dat
// 0 Author: William Howard [WilliamH]
// 0 !LDRAW_ORG Part UPDATE 2011-02
// 0 !LICENSE Licensed under CC BY 2.0 and CC BY 4.0 : see CAreadme.txt
// 
// 0 BFC CERTIFY CCW
  [0,"BFC","CERTIFY"],
  [0,"BFC","CCW"],
// 
// 0 !HISTORY 2011-12-21 [cwdee] Reworked subparting technique
// 0 !HISTORY 2011-12-29 [PTadmin] Official Update 2011-02
// 
// 
// 1 16 0 0 0 4 0 0 0 1 0 0 0 4 4-4cyli.dat
  [1,16,0,0,0,4,0,0,0,1,0,0,0,4, ldraw_lib__4_4cyli(realsolid)],
// 0 BFC INVERTNEXT
  [0,"BFC","INVERTNEXT"],
// 1 16 0 0 0 2 0 0 0 1 0 0 0 2 4-4cyli.dat
  [1,16,0,0,0,2,0,0,0,1,0,0,0,2, ldraw_lib__4_4cyli(realsolid)],
// 0
];
module ldraw_lib__77(step=0, col=false, unit=2/5, alt=false, line=0.2, solid=!$preview)
    makepoly(ldraw_lib__77(solid), step=step, col=col, unit=unit, alt=alt, line=line, solid=solid);
ldraw_lib__77(line=0.2);
// main file
use <../lib.scad>
use <77.scad>
use <u9053.scad>
$fa=1; $fs=0.2;
function ldraw_lib__70978(realsolid=false) = [
// 0 Technic Flex-System Hose 21L (420LDU)
// 0 Name: 70978.dat
// 0 Author: Tim Gould [timgould]
// 0 !LDRAW_ORG Part UPDATE 2011-02
// 0 !LICENSE Licensed under CC BY 2.0 and CC BY 4.0 : see CAreadme.txt
// 
// 0 BFC CERTIFY CCW
  [0,"BFC","CERTIFY"],
  [0,"BFC","CCW"],
// 
// 0 !KEYWORDS bar, tube
// 
// 0 !HISTORY 2011-12-29 [PTadmin] Official Update 2011-02
// 
// 
// 1 16 0 0 0 1 0 0 0 1 0 0 0 1 u9053.dat
  [1,16,0,0,0,1,0,0,0,1,0,0,0,1, ldraw_lib__u9053(realsolid)],
// 1 16 0 1 0 1 0 0 0 418 0 0 0 1 77.dat
  [1,16,0,1,0,1,0,0,0,418,0,0,0,1, ldraw_lib__77(realsolid)],
// 1 16 0 420 0 -1 0 0 0 -1 0 0 0 1 u9053.dat
  [1,16,0,420,0,-1,0,0,0,-1,0,0,0,1, ldraw_lib__u9053(realsolid)],
];
module ldraw_lib__70978(step=0, col=false, unit=2/5, alt=false, line=0.2, solid=!$preview)
    makepoly(ldraw_lib__70978(solid), step=step, col=col, unit=unit, alt=alt, line=line, solid=solid);
ldraw_lib__70978(line=0.2);
